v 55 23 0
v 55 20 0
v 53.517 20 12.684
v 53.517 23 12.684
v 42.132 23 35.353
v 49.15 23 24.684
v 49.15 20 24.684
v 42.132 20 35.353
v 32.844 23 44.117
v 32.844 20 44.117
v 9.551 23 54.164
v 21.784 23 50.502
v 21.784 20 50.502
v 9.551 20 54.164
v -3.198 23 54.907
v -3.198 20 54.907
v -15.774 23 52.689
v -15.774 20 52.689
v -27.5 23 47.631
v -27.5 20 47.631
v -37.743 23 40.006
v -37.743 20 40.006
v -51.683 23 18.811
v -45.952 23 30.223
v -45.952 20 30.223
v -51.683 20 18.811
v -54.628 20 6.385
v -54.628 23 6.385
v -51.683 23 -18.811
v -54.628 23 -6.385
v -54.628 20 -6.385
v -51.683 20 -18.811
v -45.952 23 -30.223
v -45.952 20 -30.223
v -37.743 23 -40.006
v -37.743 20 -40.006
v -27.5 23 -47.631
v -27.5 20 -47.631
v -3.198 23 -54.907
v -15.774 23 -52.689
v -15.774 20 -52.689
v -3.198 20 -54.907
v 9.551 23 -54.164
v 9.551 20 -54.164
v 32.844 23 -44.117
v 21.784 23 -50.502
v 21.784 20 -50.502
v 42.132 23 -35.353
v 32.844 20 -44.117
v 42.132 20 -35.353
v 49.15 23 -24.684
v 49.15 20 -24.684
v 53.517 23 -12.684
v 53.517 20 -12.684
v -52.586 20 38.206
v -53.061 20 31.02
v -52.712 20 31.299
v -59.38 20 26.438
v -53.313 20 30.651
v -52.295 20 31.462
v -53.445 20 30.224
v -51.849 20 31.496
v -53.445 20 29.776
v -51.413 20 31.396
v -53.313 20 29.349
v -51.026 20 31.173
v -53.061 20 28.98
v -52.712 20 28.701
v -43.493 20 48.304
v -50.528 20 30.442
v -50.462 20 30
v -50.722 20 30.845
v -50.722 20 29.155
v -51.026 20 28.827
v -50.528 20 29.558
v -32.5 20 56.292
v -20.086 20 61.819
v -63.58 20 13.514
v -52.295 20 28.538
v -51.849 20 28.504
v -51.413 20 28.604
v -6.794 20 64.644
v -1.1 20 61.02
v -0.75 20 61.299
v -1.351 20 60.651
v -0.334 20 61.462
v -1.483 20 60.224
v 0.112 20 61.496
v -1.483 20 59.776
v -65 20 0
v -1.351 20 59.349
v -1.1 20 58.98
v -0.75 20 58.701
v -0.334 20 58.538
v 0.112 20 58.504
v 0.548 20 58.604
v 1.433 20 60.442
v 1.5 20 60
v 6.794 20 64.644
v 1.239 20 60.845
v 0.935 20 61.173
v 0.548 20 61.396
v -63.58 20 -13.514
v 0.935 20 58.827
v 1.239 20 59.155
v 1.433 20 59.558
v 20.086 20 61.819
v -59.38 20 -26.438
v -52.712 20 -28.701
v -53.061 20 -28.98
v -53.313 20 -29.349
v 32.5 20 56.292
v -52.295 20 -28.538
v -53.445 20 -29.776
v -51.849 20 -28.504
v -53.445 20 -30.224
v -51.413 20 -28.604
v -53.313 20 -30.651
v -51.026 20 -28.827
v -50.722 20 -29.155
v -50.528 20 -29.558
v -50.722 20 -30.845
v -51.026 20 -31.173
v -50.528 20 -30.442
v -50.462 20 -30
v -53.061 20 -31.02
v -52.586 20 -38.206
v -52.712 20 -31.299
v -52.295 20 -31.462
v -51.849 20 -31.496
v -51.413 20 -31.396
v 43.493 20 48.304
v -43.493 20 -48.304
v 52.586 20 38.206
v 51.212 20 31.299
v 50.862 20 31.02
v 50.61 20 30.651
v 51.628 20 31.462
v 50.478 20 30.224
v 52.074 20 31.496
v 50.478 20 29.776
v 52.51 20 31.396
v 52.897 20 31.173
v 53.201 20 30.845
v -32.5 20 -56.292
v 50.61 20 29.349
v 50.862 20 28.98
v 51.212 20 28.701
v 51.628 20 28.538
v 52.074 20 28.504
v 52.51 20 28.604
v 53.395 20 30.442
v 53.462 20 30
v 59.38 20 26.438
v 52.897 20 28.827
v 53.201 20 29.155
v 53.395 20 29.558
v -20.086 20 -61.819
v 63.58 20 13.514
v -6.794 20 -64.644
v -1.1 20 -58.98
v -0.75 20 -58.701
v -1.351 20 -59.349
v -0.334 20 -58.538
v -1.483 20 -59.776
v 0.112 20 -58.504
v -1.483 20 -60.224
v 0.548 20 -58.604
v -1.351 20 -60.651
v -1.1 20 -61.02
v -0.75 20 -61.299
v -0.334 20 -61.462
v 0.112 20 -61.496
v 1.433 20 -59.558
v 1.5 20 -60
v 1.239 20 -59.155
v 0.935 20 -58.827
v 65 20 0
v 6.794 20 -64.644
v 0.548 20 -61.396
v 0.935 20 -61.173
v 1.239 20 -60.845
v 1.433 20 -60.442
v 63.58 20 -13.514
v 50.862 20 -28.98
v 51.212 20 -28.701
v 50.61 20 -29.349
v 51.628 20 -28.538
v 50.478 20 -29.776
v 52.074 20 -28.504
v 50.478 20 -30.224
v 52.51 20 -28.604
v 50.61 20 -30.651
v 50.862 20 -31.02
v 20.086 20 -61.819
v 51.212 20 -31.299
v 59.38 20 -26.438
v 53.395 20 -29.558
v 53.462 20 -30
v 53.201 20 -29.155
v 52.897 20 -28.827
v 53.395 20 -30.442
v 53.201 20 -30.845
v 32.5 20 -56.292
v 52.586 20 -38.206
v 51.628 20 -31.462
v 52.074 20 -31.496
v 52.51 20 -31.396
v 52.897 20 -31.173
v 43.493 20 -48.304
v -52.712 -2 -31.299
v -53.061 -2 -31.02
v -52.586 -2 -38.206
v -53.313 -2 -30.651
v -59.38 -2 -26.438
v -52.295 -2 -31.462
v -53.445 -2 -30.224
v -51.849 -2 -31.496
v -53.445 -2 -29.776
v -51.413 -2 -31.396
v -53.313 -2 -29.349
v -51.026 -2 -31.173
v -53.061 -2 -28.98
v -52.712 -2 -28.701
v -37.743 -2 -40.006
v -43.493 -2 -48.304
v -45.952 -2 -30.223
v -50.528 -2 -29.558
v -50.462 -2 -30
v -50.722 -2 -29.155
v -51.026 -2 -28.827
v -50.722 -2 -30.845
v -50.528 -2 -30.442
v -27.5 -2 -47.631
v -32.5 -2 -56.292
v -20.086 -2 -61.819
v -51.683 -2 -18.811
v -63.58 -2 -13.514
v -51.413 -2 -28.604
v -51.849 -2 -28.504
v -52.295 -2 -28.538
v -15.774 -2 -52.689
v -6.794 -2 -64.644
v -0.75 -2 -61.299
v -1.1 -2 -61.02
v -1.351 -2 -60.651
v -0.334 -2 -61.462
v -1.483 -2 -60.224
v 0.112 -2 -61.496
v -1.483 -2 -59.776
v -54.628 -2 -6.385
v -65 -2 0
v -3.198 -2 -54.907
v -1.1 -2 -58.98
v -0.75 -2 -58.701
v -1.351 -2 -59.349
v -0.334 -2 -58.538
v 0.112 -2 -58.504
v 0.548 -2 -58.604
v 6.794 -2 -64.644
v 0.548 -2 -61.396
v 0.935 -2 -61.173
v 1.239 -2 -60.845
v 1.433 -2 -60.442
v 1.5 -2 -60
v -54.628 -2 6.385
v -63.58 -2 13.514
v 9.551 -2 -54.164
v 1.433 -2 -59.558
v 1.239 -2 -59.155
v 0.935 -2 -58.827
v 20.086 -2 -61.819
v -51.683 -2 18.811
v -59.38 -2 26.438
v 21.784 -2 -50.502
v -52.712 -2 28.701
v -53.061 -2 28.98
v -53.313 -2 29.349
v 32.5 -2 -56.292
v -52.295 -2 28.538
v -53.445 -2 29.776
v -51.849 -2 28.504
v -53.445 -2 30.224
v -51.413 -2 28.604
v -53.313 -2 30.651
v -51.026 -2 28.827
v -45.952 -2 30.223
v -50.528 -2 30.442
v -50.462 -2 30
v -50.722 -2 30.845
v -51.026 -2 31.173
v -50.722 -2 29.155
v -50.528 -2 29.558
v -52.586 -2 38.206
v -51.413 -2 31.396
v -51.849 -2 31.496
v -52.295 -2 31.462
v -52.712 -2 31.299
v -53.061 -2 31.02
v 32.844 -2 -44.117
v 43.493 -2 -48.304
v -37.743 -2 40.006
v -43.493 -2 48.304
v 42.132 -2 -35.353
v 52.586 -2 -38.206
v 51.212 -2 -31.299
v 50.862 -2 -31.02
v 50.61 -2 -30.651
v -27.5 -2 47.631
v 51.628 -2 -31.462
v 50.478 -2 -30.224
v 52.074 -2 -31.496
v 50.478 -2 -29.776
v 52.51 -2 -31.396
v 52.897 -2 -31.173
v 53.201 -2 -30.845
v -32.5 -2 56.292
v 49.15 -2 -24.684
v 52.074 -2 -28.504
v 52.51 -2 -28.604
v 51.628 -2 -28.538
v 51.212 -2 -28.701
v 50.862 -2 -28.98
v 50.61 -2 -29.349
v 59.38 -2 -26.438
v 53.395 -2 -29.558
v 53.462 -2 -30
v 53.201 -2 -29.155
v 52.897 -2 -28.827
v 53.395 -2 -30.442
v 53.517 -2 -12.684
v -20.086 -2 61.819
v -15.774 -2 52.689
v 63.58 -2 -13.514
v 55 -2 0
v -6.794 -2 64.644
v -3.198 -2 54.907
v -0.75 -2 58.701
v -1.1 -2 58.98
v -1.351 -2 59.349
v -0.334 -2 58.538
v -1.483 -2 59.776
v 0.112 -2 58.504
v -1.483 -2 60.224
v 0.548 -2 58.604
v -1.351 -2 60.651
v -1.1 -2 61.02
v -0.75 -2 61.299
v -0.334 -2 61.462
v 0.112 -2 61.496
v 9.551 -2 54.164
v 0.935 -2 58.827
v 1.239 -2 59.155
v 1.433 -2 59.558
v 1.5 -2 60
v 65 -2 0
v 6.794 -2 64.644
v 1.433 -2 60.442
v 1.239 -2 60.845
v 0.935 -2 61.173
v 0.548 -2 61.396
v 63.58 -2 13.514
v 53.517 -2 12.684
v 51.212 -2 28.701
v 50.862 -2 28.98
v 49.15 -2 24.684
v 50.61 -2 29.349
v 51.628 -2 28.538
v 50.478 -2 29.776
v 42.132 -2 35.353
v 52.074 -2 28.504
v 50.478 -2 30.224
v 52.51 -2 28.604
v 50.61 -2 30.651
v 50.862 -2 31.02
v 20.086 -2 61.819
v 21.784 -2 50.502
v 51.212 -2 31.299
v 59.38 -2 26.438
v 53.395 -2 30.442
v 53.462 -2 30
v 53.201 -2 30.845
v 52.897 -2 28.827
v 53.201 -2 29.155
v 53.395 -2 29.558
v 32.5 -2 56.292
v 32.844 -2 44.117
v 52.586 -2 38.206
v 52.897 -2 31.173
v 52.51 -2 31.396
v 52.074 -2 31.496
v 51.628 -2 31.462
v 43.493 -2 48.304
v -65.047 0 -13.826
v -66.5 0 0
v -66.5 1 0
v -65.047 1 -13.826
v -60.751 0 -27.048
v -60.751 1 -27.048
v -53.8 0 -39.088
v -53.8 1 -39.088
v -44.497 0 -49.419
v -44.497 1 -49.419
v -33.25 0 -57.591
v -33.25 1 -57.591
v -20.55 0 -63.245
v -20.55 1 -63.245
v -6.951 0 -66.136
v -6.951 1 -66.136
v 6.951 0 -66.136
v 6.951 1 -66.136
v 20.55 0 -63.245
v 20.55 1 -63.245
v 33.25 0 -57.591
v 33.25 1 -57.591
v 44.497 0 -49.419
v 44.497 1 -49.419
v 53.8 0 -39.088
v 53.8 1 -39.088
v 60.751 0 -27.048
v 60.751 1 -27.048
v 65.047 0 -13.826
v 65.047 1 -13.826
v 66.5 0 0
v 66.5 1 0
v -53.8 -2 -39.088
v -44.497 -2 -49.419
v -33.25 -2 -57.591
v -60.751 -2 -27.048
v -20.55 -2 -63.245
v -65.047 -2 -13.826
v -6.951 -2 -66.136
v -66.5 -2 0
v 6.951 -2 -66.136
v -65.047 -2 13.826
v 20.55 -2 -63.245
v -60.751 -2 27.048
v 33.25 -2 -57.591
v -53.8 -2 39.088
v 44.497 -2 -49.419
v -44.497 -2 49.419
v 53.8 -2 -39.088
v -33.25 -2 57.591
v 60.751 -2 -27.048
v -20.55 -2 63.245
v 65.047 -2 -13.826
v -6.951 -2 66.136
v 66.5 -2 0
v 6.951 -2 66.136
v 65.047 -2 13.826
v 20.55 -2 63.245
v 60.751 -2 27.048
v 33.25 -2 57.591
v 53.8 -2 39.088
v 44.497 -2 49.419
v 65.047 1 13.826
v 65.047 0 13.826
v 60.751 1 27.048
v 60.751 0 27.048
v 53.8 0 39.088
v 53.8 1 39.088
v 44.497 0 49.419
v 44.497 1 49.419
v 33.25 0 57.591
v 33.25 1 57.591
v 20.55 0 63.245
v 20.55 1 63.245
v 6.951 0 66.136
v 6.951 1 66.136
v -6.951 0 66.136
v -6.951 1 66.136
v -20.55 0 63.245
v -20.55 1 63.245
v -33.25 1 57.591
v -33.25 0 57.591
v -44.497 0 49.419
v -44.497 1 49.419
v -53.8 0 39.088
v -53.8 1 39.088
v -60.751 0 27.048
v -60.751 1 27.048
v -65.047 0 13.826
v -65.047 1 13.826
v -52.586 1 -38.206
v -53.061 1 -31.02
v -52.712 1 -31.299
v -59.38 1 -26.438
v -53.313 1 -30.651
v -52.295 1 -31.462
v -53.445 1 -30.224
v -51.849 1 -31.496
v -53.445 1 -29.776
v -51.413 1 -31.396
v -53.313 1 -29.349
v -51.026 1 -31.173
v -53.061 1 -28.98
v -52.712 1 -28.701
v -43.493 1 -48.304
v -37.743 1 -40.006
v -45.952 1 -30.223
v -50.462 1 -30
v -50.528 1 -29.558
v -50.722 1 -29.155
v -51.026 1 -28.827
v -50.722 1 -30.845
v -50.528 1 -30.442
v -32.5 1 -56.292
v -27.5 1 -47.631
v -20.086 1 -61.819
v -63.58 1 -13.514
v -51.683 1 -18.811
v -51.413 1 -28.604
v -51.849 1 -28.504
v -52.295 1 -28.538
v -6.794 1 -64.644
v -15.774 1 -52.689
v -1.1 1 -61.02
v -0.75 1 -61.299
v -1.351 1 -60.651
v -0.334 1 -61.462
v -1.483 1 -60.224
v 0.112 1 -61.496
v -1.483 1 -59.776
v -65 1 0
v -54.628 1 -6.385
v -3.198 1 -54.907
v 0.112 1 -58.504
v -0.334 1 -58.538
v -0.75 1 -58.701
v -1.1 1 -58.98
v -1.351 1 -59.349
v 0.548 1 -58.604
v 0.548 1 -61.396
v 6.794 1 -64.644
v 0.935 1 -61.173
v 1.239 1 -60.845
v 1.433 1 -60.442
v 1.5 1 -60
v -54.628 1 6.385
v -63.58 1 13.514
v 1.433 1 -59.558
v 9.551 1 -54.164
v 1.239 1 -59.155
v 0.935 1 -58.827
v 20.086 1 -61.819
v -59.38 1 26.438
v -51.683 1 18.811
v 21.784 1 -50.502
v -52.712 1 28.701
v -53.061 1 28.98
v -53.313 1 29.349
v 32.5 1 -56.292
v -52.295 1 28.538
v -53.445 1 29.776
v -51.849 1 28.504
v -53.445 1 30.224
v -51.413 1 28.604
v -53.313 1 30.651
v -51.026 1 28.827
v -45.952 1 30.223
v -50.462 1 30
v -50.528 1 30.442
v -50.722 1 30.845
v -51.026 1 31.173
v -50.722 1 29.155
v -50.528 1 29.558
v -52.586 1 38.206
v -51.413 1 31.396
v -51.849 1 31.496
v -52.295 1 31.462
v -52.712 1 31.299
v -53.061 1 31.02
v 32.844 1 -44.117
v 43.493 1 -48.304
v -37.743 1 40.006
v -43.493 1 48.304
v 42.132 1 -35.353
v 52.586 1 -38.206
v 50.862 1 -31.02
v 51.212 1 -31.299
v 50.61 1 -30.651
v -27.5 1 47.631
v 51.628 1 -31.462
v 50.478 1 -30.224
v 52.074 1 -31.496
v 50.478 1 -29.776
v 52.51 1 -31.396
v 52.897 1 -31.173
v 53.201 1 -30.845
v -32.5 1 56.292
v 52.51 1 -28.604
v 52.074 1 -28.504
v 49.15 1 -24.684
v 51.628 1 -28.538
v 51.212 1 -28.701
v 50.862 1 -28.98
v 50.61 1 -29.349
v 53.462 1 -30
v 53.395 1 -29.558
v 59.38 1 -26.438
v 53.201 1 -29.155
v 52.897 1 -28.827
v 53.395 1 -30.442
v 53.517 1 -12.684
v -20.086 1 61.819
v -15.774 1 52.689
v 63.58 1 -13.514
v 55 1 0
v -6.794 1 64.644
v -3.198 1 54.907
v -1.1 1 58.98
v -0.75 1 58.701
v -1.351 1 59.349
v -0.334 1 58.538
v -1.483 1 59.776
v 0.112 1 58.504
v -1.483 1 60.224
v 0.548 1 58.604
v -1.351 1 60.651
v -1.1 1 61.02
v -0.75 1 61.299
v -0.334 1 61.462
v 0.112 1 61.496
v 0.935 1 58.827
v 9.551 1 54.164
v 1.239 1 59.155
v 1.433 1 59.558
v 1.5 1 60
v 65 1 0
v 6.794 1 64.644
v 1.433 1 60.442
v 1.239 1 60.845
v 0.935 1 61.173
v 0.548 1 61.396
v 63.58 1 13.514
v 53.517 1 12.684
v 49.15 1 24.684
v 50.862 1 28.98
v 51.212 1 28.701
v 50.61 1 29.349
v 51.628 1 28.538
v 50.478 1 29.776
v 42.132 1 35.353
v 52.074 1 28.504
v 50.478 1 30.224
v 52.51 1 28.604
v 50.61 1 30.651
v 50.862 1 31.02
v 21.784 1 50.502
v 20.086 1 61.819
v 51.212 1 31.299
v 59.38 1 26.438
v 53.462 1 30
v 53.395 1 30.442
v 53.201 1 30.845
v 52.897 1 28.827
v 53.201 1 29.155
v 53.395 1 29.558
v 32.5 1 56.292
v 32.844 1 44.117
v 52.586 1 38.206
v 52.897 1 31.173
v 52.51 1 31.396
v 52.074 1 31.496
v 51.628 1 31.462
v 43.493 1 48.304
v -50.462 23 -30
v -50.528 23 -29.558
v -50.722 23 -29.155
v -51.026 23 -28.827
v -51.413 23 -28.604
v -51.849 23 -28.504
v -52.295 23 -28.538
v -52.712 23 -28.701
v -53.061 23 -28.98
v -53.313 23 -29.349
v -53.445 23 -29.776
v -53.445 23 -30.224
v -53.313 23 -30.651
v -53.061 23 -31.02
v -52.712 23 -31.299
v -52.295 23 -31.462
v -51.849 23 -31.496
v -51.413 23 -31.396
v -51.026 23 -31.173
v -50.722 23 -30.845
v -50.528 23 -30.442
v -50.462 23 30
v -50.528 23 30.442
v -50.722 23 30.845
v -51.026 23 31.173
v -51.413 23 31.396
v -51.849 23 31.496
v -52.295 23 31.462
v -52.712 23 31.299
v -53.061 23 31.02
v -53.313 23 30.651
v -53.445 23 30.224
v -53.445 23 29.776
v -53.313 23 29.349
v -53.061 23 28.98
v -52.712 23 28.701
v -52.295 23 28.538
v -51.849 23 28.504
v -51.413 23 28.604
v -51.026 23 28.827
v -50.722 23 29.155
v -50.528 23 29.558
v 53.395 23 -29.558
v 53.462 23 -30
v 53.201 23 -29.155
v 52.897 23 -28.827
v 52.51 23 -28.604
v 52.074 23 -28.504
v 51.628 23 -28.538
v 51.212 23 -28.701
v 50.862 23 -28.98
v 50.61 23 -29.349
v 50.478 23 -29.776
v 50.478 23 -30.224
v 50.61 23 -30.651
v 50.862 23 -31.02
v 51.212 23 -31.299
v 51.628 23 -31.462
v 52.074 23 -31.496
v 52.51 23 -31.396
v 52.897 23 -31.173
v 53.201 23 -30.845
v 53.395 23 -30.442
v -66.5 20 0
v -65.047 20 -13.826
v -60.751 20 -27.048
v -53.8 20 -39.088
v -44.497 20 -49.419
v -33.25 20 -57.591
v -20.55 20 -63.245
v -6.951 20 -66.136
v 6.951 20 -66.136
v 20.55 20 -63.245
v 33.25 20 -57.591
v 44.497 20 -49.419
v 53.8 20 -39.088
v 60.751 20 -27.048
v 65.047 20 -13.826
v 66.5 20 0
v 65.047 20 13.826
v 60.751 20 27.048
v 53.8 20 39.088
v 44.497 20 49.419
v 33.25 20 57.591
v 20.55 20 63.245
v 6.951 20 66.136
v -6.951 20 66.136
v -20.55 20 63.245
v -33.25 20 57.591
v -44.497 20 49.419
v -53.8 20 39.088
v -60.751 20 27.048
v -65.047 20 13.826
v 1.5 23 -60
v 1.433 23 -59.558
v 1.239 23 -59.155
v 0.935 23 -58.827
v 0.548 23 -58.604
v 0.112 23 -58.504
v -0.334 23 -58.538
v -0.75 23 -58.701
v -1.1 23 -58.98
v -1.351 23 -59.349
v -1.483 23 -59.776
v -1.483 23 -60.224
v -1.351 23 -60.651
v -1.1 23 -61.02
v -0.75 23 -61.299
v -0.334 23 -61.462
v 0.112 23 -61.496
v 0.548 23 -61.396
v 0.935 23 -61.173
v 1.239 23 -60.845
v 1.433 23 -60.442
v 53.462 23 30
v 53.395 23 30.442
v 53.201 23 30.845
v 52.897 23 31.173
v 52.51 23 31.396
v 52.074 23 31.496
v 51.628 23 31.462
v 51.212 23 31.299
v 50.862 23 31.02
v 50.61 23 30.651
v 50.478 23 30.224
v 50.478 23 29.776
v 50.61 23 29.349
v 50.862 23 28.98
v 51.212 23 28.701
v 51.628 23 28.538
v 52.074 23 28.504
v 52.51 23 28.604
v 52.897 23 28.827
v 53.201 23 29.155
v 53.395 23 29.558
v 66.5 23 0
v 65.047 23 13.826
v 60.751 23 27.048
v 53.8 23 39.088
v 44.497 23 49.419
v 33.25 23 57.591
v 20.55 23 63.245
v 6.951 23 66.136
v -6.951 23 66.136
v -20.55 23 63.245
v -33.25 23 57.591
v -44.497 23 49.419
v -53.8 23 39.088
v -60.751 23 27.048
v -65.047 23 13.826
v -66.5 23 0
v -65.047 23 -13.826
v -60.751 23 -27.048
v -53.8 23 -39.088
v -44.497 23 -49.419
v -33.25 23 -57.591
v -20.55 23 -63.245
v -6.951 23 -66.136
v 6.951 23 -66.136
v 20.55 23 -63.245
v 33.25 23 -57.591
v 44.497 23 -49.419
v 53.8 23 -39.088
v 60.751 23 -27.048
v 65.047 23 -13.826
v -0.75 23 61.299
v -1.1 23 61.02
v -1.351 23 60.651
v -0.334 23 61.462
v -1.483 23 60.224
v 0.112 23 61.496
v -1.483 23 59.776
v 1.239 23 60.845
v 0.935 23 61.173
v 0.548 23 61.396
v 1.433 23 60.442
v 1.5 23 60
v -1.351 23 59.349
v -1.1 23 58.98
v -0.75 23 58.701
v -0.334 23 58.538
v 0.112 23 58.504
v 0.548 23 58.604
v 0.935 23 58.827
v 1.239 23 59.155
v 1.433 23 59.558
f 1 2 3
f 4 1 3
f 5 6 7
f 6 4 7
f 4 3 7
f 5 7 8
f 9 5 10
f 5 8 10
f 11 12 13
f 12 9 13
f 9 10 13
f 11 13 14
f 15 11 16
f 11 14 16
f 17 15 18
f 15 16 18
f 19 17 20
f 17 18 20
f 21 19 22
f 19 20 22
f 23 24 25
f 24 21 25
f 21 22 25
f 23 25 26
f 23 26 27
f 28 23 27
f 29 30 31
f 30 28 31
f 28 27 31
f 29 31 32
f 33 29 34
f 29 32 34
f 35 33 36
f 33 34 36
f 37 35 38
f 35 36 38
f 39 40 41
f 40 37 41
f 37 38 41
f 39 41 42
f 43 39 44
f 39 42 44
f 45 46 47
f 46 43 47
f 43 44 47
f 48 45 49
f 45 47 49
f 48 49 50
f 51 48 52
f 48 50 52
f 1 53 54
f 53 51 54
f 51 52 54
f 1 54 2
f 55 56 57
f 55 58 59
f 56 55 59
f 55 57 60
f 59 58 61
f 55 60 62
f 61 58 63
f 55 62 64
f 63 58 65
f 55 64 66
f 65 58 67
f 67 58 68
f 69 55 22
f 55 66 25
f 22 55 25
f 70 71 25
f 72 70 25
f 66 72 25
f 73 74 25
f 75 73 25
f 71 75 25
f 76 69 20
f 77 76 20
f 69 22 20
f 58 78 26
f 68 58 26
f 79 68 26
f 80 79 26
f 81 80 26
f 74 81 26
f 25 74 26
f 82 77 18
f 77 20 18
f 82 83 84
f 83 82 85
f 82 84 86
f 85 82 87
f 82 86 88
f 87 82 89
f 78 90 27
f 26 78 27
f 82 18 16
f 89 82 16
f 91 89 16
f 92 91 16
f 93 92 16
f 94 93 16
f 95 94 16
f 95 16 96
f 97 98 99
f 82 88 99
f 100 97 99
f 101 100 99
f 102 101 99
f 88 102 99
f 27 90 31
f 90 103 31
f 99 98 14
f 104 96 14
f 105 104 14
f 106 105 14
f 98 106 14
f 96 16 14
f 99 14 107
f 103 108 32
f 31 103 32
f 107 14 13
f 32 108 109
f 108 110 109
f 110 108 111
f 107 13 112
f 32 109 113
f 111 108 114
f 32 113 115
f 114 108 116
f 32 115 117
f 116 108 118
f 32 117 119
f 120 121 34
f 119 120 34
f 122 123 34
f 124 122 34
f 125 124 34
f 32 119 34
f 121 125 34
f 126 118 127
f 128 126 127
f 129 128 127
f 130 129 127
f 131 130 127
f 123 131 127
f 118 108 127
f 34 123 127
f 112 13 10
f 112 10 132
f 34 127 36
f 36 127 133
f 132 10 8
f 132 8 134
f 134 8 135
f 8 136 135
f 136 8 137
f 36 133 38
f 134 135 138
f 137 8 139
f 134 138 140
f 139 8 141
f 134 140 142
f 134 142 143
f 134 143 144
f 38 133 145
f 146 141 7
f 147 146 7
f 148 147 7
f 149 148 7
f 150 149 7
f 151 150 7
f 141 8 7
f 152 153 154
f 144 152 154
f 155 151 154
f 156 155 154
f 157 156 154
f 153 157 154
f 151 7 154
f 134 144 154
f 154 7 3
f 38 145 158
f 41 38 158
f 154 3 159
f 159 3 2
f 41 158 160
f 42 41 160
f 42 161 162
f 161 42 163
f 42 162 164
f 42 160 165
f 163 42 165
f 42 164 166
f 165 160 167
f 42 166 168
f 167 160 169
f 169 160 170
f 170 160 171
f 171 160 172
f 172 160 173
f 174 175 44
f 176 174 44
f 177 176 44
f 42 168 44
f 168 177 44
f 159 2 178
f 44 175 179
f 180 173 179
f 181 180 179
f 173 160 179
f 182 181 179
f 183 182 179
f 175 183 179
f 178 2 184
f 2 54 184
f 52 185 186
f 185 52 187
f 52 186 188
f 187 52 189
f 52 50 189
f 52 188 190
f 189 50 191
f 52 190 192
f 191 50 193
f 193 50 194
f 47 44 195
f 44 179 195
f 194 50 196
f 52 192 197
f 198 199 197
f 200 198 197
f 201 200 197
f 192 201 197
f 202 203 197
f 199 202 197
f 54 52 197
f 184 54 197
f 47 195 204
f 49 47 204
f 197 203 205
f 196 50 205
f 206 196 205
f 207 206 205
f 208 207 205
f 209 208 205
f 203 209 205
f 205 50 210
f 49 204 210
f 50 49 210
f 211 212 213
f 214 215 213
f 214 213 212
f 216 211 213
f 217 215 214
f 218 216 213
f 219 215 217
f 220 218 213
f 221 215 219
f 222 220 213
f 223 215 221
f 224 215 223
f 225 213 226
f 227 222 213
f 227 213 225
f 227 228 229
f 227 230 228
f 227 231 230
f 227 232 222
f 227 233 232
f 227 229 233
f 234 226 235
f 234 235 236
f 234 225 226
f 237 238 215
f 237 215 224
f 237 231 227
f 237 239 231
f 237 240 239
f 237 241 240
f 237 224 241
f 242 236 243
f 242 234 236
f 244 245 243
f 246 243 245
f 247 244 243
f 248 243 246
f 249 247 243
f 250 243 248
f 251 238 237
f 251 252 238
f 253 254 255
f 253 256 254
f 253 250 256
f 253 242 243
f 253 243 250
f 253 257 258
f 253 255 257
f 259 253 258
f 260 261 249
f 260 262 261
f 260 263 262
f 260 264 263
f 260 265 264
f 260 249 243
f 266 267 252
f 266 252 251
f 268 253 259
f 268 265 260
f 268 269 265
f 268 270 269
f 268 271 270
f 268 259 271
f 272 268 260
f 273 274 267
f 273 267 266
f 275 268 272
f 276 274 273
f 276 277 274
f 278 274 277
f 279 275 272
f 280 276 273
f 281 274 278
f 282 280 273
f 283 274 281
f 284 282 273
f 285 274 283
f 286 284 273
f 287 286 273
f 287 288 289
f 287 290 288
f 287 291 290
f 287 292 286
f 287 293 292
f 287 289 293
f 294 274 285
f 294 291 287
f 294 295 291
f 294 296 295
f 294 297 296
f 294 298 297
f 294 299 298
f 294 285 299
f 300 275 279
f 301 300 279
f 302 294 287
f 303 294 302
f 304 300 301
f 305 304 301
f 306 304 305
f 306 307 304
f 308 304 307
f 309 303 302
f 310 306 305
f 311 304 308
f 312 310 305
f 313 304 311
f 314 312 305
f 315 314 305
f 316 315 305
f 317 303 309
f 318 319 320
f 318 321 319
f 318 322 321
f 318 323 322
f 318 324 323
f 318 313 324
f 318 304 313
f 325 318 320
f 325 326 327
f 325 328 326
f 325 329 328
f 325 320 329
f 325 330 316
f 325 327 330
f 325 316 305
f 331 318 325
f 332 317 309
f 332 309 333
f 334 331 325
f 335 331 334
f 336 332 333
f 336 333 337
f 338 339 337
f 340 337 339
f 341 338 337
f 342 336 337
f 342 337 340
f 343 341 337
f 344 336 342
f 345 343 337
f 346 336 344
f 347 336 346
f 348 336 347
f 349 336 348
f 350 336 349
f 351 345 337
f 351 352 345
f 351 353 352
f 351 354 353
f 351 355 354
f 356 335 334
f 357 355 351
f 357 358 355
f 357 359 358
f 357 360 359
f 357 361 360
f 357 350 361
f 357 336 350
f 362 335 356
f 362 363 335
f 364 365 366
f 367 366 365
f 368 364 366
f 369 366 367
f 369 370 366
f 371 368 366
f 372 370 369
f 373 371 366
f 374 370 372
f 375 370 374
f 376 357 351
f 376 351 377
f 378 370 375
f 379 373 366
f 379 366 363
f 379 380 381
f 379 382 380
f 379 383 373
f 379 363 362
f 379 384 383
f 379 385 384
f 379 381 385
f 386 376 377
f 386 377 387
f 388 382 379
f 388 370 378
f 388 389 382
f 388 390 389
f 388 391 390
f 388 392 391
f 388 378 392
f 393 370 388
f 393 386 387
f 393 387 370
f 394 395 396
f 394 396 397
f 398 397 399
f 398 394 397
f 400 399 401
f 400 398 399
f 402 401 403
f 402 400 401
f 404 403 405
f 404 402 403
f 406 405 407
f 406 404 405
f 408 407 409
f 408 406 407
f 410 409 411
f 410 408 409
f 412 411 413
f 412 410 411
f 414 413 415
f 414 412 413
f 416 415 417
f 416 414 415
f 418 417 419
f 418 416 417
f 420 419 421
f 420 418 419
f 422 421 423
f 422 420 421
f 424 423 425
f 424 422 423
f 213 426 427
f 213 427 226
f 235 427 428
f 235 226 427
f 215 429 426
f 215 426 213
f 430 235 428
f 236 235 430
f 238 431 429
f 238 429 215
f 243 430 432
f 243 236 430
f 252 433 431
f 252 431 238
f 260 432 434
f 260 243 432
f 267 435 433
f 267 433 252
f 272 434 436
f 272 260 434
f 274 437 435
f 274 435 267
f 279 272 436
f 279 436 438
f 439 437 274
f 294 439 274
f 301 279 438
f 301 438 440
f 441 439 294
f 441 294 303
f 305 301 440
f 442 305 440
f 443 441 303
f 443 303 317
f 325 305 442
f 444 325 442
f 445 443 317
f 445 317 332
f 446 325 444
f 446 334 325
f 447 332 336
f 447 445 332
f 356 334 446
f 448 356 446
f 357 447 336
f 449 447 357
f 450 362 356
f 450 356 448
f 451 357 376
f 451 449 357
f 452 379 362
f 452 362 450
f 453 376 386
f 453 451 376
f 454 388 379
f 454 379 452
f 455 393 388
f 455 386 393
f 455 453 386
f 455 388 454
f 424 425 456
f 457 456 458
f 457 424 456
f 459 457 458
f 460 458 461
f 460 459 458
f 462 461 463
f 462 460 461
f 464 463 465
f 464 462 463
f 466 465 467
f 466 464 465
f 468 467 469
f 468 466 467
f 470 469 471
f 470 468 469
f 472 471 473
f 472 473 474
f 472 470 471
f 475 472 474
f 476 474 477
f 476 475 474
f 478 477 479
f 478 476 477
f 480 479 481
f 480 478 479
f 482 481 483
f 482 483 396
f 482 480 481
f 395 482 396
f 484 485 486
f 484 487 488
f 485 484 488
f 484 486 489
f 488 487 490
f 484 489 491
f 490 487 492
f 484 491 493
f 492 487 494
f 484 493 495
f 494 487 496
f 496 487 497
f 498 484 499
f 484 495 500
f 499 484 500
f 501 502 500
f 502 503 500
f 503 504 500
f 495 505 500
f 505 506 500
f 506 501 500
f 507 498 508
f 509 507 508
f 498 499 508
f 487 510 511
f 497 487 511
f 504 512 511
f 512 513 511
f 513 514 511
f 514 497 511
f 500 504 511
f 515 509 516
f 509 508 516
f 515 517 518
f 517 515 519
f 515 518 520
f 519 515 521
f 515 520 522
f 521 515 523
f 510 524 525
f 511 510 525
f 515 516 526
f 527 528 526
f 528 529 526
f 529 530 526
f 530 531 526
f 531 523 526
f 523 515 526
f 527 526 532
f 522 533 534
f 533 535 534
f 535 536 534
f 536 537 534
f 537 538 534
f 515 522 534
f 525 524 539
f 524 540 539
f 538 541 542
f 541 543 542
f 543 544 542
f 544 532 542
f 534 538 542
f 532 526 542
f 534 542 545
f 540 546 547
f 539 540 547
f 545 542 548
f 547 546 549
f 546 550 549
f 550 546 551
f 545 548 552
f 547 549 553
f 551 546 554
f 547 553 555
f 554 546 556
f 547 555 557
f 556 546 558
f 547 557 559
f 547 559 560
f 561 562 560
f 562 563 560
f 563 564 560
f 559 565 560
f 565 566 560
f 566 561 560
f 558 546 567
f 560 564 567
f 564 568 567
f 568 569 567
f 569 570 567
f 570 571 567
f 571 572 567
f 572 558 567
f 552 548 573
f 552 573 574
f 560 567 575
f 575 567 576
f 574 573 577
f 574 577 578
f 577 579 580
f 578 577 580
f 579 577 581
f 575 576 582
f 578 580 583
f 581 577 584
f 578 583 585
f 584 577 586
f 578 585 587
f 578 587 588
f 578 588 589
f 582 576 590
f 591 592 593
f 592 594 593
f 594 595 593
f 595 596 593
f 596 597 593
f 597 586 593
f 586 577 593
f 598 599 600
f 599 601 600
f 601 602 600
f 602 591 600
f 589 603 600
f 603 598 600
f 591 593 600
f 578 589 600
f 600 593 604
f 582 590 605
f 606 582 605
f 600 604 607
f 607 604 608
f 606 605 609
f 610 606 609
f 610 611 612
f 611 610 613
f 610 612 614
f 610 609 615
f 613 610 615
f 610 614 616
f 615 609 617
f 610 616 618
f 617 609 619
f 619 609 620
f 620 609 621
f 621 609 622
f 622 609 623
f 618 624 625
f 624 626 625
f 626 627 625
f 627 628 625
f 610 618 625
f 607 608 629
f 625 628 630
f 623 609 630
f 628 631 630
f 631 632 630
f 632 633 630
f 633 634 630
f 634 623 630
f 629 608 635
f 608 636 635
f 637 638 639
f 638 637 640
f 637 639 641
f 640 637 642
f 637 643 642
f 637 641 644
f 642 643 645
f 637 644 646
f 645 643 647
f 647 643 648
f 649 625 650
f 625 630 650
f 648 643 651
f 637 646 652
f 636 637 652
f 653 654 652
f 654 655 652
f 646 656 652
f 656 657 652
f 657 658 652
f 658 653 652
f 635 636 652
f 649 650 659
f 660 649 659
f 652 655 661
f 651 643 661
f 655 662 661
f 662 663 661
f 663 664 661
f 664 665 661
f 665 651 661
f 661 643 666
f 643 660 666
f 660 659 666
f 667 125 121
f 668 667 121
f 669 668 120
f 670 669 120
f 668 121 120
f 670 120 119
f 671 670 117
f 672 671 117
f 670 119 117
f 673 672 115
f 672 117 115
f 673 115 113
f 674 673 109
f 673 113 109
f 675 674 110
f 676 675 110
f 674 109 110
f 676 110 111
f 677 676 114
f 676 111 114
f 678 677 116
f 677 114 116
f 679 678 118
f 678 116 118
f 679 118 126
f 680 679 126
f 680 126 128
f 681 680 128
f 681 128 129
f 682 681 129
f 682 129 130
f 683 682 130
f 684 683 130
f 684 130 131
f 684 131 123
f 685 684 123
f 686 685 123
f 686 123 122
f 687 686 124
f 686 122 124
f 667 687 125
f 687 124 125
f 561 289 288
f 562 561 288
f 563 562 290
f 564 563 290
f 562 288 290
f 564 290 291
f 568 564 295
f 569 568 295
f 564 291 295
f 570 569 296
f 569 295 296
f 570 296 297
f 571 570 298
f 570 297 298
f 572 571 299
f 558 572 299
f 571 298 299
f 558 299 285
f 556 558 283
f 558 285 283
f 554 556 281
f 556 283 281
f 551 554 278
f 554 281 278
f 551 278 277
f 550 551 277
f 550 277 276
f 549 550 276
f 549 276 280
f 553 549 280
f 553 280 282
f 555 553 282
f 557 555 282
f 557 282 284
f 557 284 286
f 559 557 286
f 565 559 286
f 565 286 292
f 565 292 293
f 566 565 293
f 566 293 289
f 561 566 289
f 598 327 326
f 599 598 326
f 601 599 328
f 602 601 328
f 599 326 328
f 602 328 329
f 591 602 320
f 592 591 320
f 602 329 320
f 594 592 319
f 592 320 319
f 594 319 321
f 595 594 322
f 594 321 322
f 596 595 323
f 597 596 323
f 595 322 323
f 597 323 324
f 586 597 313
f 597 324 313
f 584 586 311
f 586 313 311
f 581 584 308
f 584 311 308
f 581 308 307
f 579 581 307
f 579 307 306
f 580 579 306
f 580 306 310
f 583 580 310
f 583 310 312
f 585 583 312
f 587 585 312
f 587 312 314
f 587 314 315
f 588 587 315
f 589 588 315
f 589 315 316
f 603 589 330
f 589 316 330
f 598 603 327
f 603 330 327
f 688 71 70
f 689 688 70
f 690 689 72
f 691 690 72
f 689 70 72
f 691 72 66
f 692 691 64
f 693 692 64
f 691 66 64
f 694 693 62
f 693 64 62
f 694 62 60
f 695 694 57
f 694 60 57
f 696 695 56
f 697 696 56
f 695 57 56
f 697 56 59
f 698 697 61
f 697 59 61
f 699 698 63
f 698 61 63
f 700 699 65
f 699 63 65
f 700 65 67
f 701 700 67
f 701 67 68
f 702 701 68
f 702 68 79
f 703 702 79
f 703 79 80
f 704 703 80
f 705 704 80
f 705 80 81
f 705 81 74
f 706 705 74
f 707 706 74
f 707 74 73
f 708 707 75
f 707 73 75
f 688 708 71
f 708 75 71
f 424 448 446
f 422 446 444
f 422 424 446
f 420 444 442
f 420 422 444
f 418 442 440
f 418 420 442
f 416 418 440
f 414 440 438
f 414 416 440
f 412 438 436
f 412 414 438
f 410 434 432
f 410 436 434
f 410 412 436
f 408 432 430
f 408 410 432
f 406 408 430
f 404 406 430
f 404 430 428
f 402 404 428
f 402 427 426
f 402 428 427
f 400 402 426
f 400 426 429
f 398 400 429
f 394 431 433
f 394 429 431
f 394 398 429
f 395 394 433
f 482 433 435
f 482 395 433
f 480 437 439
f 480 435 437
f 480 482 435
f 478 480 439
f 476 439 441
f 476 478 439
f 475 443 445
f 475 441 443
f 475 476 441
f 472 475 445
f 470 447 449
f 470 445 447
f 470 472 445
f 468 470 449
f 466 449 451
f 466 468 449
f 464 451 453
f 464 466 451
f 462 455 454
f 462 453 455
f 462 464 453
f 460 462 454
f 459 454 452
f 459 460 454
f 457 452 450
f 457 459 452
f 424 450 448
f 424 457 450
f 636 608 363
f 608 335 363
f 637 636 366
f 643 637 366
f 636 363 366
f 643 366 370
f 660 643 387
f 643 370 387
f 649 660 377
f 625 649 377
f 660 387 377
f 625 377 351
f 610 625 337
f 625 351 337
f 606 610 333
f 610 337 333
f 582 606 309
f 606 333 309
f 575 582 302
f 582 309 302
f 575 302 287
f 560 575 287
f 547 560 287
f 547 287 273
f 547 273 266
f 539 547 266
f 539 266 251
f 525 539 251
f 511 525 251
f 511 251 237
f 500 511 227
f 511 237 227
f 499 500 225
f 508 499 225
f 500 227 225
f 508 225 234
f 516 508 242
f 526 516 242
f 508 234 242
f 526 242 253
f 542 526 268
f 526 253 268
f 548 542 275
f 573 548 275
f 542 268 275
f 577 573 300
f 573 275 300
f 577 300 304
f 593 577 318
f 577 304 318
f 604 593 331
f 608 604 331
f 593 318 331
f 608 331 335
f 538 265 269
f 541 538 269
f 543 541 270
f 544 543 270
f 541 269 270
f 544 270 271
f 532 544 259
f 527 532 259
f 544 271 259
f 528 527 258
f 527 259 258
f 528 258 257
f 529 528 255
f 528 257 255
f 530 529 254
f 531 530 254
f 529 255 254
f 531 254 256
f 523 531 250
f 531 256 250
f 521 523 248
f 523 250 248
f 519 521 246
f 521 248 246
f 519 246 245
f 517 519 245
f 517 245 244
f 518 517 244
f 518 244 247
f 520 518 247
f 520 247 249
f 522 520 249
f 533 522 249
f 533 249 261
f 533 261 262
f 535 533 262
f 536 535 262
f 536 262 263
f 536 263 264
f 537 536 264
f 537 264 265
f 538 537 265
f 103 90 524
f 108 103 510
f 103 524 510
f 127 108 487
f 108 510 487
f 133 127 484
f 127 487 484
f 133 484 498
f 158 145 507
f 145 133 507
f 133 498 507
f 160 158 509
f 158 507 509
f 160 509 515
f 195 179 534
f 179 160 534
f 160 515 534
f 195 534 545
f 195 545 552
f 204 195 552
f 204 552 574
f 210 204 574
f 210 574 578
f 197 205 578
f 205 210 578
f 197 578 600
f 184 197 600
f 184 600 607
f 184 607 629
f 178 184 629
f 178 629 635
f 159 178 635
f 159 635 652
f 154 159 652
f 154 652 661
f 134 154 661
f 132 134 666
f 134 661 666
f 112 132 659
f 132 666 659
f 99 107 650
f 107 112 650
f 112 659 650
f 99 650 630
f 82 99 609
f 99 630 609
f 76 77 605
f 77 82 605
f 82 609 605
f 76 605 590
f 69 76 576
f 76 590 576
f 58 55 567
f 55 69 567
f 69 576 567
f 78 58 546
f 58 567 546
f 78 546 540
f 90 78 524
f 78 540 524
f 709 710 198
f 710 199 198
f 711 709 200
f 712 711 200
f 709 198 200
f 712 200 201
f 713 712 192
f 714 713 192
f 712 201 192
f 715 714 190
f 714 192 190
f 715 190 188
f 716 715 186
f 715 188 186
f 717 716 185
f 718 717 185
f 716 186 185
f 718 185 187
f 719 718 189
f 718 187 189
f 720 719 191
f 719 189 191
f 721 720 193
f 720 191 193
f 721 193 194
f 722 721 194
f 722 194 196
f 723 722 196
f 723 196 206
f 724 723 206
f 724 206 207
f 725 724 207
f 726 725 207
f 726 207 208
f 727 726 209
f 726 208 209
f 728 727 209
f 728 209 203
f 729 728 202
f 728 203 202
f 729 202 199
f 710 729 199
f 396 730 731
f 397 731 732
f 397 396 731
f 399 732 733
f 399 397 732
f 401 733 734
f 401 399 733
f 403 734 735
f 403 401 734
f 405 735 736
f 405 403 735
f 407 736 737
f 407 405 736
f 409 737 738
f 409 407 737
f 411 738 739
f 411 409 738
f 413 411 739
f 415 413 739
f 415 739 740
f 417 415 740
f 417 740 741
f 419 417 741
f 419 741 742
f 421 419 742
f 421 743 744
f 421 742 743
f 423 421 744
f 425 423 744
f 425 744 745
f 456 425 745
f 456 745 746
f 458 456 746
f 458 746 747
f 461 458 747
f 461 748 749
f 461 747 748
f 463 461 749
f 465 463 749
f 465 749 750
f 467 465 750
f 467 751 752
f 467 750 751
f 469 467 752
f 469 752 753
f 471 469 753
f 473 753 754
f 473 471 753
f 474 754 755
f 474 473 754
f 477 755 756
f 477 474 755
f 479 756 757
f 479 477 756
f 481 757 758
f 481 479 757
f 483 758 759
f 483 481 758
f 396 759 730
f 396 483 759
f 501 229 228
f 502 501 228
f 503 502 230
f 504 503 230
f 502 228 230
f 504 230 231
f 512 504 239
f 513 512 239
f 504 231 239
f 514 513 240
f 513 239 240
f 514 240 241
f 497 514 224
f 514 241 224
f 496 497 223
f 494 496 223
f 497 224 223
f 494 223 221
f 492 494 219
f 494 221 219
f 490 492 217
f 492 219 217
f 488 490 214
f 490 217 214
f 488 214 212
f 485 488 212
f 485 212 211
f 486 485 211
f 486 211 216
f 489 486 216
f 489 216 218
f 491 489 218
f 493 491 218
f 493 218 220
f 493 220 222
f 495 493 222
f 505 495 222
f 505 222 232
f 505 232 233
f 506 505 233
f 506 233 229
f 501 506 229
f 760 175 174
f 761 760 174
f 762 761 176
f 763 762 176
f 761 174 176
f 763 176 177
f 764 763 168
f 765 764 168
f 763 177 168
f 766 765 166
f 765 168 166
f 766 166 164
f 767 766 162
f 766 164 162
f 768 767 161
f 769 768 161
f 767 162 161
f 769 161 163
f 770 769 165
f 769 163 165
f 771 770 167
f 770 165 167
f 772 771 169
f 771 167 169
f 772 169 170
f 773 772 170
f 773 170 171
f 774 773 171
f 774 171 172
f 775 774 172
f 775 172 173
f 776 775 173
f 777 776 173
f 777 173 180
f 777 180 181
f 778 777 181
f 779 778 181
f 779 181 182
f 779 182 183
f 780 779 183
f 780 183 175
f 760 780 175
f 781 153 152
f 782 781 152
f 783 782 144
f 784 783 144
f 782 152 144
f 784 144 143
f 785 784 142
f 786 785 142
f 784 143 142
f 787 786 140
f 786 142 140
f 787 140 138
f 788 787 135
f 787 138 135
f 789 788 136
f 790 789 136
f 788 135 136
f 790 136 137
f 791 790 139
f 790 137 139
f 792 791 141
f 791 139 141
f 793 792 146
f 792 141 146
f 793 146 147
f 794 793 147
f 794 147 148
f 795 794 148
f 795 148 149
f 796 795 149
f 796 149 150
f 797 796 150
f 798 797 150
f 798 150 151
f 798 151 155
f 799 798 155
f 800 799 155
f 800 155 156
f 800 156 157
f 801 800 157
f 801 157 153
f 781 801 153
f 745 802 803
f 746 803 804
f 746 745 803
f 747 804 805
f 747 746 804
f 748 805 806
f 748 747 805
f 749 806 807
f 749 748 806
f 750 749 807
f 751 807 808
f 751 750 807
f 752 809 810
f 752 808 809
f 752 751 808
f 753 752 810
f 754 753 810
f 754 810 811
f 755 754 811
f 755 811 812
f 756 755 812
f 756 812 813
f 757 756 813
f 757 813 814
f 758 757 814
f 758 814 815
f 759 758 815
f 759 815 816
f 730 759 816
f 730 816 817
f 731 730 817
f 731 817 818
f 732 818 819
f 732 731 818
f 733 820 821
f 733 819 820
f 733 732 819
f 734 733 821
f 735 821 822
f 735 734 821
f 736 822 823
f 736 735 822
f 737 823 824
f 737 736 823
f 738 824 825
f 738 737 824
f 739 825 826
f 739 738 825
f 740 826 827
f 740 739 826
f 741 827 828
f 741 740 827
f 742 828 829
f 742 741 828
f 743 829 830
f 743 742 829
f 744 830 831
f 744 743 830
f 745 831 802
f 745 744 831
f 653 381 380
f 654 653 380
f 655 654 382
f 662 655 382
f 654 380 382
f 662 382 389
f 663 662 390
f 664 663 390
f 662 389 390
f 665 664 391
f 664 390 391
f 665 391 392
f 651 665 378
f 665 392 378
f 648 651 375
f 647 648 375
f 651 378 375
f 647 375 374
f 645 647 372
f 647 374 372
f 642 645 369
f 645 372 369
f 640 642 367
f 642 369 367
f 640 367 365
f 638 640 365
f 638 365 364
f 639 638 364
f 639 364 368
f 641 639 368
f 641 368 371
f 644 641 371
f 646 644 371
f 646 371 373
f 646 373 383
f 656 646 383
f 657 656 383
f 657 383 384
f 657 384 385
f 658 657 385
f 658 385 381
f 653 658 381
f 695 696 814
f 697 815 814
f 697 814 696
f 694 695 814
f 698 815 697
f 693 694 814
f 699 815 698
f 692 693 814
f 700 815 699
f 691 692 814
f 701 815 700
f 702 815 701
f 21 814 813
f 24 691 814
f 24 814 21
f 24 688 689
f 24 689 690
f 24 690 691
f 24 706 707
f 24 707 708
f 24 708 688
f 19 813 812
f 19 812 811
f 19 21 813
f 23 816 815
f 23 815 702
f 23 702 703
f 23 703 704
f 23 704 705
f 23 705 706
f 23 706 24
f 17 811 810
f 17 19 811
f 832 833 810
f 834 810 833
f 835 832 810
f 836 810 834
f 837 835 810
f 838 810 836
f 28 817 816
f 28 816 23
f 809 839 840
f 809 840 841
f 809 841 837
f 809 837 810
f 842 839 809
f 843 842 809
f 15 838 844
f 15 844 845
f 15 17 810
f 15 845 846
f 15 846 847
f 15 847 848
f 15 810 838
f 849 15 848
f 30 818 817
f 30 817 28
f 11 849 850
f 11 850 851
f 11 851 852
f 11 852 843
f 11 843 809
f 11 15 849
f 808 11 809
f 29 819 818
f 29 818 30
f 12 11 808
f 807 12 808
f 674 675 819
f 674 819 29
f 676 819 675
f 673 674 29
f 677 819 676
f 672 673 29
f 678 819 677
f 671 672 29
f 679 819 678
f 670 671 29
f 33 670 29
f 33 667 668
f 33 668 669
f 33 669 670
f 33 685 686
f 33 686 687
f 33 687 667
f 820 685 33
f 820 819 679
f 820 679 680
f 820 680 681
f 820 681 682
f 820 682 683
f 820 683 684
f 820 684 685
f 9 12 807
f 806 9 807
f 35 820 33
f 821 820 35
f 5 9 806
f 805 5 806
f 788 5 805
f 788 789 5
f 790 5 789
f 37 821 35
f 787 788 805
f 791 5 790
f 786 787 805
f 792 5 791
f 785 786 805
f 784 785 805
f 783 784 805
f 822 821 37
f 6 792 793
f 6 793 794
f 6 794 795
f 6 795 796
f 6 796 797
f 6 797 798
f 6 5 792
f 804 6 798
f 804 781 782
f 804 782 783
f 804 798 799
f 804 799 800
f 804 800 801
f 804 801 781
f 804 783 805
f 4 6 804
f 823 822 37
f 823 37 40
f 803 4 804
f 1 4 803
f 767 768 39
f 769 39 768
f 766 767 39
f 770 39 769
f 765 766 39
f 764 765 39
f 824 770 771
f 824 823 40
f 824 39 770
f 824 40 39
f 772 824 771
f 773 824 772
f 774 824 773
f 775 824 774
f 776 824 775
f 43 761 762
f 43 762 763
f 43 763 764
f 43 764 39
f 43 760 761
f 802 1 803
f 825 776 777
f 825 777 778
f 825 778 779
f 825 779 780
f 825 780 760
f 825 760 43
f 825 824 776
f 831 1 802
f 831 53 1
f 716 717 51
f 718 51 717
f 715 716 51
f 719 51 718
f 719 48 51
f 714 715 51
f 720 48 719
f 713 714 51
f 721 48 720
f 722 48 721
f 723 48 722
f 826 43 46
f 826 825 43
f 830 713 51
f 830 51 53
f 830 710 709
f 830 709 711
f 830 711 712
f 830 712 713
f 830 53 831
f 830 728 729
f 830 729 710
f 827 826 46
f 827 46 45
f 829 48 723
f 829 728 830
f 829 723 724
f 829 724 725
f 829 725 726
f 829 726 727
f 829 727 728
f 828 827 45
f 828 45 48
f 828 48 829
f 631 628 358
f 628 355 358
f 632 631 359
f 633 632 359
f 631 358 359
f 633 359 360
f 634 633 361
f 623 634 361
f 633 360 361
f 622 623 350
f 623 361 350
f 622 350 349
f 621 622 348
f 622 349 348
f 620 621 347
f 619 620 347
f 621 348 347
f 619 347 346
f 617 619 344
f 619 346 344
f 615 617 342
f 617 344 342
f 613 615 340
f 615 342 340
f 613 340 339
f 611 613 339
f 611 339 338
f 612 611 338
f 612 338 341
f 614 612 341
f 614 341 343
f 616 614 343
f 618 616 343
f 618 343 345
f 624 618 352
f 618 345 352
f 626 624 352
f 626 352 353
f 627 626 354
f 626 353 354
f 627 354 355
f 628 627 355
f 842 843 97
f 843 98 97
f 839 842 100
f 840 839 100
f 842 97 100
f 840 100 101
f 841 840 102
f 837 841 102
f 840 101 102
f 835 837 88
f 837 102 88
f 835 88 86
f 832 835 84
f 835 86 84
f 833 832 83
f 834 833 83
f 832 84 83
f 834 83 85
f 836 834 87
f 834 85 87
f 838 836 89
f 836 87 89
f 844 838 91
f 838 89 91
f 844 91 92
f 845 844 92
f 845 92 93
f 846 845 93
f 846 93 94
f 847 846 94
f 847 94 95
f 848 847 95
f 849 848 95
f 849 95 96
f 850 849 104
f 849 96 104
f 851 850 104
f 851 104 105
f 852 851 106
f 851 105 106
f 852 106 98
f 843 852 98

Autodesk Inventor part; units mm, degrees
ref_plane "YZ Plane" through (0, 0, 0) normal (1, 0, 0) x (0, 1, 0)
ref_plane "XZ Plane" through (0, 0, 0) normal (0, 1, 0) x (-1, 0, 0)
ref_plane "XY Plane" through (0, 0, 0) normal (0, 0, 1) x (1, 0, 0)
sketch "Sketch1" plane through (0, 0, 0) normal (0, 1, 0) x (-1, 0, 0)
  circle A0 centre (0, 0) radius 65
  circle A1 centre (0, 0) radius 66.5
  dimension "d0" = 130
  dimension "d1" = 133
extrude "Extrusion1" add sketch "Sketch1" along normal blind 20
sketch "Sketch3" plane through (0, 0, 0) normal (0, -1, 0) x (1, 0, 0)
  circle A0 centre (0, -8) radius 1.5
  circle A1 centre (0, 8) radius 1.5
  circle A2 centre (9.5, 0) radius 1.5
  circle A3 centre (-9.5, 0) radius 1.5
  circle A4 centre (0, 0) radius 3.5464
  dimension "d11" = 3
  dimension "d12" = 8
  dimension "d13" = 3
  dimension "d14" = 9.5
extrude "Extrusion3" cut sketch "Sketch3" against normal blind 3
sketch "Sketch4" plane through (0, 0, 0) normal (0, -1, 0) x (1, 0, 0)
  circle A0 centre (0, 0) radius 66.5 projected
  circle A1 centre (0, 0) radius 65
  dimension "d17" = 130
extrude "Extrusion4" add sketch "Sketch4" along normal blind 2
sketch "Sketch5" plane through (0, 20, 0) normal (0, 1, 0) x (1, 0, 0)
  circle A0 centre (0, 0) radius 66.5
  circle A1 centre (0, 0) radius 55
  dimension "d20" = 133
  dimension "d23" = 110
extrude "Extrusion5" add sketch "Sketch5" along normal blind 3
sketch "Sketch6" plane through (0, -2, 0) normal (0, -1, 0) x (1, 0, 0)
  circle A0 centre (0, 0) radius 66.5
  circle A1 centre (0, 0) radius 55
  dimension "d24" = 133
  dimension "d25" = 110
extrude "Extrusion6" add sketch "Sketch6" against normal blind 3
sketch "Sketch7" plane through (0, -2, 0) normal (0, -1, 0) x (1, 0, 0)
  circle A0 centre (0, -60) radius 1.5
  circle A1 centre (51.9615, -30) radius 1.5
  circle A2 centre (51.9615, 30) radius 1.5
  circle A3 centre (0, 60) radius 1.5
  circle A4 centre (-51.9615, 30) radius 1.5
  circle A5 centre (-51.9615, -30) radius 1.5
  point P0 (0, 0)
  dimension "d28" = 3
  dimension "d31" = 360
  dimension "d35" = 60
extrude "Extrusion7" cut sketch "Sketch7" against normal blind 1000
sketch "Sketch8" plane through (0, 23, 0) normal (0, 1, 0) x (1, 0, 0)
  circle A0 centre (0, 0) radius 55
  dimension "d36" = 110
properties part number "Motor mount (plain)"
